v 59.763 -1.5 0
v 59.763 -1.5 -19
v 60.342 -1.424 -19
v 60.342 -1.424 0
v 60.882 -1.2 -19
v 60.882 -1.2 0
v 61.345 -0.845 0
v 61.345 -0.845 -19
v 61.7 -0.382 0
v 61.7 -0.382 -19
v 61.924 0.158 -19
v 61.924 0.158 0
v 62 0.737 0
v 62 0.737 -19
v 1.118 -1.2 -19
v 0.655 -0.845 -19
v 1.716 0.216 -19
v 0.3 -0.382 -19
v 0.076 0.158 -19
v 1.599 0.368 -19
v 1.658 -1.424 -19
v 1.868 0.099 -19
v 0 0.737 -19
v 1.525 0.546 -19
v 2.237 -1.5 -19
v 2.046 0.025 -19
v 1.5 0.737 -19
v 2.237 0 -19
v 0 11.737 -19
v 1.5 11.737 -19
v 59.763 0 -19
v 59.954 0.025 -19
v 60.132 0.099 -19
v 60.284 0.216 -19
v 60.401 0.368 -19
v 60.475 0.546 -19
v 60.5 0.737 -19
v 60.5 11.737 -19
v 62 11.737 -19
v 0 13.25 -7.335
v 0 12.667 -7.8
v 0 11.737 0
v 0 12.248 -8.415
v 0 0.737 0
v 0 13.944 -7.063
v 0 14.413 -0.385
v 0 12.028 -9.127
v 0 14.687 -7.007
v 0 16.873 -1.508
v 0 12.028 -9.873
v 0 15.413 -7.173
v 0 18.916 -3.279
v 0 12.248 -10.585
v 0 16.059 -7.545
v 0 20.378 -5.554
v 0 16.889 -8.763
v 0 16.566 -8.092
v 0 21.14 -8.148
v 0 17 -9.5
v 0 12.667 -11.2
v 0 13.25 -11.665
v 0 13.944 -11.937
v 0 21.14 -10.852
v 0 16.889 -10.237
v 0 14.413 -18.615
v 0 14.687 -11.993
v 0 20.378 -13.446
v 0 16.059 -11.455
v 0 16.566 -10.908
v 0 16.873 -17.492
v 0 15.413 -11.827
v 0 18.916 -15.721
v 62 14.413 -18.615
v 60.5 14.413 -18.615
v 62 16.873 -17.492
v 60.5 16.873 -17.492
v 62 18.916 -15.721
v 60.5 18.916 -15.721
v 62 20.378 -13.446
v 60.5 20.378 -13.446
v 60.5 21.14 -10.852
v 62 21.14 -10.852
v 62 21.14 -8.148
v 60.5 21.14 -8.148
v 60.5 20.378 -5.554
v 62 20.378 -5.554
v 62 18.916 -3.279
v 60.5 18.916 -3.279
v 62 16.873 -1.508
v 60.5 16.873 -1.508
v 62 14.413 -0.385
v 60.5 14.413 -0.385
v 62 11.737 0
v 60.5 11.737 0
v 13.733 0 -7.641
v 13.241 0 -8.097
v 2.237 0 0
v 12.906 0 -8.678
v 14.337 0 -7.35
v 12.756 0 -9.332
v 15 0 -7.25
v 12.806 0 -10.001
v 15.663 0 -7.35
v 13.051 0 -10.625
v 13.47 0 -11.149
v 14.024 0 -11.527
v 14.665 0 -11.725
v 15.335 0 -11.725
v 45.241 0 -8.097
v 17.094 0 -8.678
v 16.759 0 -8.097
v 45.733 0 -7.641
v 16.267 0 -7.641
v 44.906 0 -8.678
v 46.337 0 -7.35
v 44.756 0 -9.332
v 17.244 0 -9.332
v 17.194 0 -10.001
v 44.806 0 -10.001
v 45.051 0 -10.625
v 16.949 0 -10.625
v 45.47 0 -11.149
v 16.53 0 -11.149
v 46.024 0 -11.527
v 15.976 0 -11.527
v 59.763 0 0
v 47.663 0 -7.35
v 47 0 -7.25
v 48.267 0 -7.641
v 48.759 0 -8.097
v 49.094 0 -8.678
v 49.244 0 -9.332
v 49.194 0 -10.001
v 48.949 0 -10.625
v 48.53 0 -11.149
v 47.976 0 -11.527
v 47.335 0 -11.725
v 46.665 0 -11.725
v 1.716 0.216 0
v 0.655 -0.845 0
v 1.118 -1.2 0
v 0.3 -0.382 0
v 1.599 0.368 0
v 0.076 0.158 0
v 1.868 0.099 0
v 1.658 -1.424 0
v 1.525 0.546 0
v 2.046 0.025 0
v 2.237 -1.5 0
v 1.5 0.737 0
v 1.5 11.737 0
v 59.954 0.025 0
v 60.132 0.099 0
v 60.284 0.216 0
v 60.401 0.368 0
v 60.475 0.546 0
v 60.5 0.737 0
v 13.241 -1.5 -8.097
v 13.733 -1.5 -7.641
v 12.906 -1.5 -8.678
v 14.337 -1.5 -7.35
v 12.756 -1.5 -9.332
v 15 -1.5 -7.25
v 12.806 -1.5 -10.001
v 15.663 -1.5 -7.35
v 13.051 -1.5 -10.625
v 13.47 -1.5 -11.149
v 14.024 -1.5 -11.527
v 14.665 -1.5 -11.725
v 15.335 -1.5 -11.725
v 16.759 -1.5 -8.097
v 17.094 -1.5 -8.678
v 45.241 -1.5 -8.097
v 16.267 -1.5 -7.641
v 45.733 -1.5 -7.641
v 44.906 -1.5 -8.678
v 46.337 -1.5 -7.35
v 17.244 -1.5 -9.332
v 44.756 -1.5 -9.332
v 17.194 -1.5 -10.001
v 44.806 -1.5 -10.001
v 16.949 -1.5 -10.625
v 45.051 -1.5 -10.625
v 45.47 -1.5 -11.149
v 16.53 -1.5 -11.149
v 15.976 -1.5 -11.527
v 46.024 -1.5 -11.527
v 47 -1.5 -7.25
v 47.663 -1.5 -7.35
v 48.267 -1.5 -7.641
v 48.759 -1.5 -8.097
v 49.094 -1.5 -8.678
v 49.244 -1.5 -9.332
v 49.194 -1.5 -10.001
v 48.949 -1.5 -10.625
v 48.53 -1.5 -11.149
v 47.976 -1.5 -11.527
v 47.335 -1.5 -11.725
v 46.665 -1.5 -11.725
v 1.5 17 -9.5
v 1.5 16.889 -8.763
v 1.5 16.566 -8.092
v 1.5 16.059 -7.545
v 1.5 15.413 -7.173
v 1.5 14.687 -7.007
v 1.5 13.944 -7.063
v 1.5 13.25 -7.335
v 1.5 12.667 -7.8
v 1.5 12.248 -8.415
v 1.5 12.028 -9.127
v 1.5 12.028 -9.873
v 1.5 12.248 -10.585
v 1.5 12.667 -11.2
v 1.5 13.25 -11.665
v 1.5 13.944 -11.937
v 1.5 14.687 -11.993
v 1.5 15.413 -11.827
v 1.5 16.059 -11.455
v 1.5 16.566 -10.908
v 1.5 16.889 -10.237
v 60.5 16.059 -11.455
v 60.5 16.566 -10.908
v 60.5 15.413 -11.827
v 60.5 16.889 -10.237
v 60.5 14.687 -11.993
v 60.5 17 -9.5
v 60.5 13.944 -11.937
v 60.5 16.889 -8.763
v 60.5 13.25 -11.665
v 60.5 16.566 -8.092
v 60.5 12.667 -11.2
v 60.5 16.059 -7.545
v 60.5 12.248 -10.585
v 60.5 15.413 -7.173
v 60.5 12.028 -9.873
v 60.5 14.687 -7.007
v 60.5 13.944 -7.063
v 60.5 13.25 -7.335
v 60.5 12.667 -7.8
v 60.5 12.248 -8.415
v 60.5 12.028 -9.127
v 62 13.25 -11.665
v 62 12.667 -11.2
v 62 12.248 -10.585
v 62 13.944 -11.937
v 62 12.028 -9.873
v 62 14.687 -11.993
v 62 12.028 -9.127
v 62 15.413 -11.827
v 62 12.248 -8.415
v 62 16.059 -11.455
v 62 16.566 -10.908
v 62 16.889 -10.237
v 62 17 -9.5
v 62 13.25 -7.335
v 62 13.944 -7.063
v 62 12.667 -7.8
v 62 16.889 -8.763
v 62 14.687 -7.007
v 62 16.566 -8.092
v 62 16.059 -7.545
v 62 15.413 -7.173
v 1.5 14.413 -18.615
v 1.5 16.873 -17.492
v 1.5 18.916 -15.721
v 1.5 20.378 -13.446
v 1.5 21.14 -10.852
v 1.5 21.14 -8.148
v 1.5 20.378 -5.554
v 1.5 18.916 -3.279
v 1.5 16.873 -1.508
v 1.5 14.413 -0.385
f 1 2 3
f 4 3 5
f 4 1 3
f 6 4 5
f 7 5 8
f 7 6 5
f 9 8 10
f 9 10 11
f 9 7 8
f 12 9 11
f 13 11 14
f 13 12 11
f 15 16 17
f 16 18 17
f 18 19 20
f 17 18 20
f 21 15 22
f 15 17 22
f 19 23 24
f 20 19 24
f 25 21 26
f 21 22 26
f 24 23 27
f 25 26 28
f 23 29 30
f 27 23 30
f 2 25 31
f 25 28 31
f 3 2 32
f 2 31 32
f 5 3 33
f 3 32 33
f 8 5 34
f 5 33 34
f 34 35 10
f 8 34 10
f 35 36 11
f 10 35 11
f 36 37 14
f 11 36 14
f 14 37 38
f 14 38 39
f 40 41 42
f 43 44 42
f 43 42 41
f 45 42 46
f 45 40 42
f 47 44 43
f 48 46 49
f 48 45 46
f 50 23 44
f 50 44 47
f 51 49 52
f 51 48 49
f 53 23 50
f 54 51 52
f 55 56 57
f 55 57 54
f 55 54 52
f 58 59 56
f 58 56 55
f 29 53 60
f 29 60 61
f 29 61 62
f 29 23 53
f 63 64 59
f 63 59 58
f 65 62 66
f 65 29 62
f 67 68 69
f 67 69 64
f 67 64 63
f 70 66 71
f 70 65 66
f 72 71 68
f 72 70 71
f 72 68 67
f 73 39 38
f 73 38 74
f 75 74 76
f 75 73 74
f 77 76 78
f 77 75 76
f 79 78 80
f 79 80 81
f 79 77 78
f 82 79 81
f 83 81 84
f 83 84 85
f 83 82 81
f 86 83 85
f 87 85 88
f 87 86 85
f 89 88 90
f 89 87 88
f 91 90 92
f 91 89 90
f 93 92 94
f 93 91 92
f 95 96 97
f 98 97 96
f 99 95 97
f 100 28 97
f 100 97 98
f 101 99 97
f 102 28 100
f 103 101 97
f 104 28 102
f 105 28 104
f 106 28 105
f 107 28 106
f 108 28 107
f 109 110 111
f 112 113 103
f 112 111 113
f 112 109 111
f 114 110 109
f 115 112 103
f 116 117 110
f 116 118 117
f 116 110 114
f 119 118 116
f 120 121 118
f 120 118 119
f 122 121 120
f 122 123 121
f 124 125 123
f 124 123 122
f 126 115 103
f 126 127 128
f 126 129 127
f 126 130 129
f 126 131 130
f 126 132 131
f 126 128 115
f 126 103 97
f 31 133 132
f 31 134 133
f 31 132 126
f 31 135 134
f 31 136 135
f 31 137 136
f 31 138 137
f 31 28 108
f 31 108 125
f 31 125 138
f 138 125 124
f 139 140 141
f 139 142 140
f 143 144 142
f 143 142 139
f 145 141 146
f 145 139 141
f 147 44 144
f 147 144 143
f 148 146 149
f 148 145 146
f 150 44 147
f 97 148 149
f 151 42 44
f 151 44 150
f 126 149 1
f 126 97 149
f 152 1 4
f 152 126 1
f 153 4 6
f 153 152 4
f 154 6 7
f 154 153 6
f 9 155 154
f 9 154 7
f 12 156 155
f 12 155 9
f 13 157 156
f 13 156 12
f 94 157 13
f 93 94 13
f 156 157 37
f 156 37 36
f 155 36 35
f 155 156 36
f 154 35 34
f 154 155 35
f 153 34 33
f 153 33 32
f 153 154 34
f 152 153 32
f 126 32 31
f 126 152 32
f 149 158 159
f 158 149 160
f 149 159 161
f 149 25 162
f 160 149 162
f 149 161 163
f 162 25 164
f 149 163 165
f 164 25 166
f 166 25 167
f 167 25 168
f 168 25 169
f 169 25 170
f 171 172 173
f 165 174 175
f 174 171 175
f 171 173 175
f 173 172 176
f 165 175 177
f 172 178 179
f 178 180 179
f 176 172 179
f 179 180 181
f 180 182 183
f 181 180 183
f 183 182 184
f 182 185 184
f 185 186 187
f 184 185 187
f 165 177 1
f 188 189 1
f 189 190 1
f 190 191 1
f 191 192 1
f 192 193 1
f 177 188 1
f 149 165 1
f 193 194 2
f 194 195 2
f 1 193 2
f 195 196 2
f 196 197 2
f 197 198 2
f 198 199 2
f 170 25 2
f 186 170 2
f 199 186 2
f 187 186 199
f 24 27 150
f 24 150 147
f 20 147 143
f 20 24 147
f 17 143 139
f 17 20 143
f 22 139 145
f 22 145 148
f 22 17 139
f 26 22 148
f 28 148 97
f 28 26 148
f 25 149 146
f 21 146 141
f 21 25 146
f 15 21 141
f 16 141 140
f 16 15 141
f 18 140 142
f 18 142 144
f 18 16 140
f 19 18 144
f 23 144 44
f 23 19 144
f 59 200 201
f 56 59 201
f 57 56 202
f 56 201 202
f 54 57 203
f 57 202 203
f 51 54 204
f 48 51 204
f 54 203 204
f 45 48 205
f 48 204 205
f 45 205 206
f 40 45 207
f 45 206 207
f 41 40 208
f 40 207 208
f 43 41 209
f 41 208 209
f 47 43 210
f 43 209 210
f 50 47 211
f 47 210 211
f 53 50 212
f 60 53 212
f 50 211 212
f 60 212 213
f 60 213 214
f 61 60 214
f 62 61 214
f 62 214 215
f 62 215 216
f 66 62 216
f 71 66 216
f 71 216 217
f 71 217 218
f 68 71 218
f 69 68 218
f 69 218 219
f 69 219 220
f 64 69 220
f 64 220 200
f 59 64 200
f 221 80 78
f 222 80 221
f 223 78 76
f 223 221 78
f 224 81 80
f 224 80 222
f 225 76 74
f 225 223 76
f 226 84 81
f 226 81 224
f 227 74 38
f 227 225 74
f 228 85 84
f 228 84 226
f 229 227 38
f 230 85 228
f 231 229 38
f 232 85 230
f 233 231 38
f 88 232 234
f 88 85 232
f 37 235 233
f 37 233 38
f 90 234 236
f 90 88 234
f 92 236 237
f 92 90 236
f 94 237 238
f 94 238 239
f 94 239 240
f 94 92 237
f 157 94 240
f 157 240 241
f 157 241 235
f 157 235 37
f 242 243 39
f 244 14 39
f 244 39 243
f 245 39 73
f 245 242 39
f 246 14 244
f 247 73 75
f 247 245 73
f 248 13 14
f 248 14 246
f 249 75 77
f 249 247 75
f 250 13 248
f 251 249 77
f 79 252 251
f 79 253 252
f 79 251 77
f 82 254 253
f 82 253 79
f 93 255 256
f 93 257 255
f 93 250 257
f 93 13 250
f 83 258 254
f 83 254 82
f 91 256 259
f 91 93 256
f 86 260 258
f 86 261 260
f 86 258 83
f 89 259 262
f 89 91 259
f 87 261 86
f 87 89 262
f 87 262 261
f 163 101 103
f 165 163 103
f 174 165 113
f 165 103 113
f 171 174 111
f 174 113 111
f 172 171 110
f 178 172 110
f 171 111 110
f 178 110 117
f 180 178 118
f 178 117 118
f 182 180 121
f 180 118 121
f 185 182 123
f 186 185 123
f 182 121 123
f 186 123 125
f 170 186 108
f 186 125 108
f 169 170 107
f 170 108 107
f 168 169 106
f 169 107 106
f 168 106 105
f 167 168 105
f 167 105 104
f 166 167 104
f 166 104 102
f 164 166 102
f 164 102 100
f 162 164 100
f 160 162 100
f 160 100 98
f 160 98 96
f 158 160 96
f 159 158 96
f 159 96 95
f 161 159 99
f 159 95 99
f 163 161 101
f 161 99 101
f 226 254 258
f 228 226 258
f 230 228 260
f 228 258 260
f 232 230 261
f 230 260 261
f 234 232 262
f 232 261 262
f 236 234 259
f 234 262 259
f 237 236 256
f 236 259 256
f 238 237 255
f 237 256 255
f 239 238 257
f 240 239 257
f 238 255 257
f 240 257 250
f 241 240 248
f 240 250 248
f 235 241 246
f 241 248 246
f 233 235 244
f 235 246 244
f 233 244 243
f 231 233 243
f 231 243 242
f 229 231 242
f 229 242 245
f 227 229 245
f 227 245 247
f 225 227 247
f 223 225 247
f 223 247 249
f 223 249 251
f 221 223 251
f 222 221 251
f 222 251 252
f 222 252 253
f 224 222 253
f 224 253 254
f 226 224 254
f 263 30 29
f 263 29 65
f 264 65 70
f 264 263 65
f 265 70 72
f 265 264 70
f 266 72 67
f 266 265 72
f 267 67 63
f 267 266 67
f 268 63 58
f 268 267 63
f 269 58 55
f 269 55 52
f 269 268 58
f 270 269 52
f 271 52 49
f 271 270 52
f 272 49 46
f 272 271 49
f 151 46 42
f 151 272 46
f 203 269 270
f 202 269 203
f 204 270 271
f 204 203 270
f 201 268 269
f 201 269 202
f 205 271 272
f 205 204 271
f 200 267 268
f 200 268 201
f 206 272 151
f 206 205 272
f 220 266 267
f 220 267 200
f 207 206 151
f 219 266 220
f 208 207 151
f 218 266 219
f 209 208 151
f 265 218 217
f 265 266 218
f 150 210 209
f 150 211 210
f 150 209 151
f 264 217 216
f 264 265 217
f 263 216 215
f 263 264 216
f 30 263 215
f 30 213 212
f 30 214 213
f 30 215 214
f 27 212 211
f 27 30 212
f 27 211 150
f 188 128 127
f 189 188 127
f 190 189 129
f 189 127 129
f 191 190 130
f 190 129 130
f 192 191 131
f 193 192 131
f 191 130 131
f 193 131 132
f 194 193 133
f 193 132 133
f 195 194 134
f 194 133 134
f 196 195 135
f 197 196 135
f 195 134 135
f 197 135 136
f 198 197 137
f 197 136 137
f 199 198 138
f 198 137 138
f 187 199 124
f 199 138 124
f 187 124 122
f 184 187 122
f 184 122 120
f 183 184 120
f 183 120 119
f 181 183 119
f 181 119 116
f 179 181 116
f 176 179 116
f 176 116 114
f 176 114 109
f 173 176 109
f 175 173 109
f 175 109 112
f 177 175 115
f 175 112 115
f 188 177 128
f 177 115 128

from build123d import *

# Parameters (mm, degrees)
SKETCH1_W                    = 62
SKETCH1_H                    = 19
SKETCH1_R                    = 2.25
BASE_FLANGE1_DEPTH           = 1.5
EDGE_FLANGE1_STRIP_W         = 7.4732
EDGE_FLANGE1_STRIP_H         = 1.5
EDGE_FLANGE1_STRIP_CUT_DEPTH = 19
EDGE_FLANGE1_DEPTH           = 19
EDGE_FLANGE2_STRIP_W         = 7.4732
EDGE_FLANGE2_STRIP_H         = 1.5
EDGE_FLANGE2_STRIP_CUT_DEPTH = 19
EDGE_FLANGE2_DEPTH           = 19
SKETCH12_R                   = 2.5
CUT_EXTRUDE1_DEPTH           = 69.317274536


# Sheet-metal steps are written as plain solids
with BuildPart() as part:
    # Sketch1 → Base-Flange1 (new body)
    with BuildSketch(Plane(origin=(0, 0, 0), x_dir=(1, 0, 0), z_dir=(0, 1, 0))):
        with Locations((31, 9.5)):
            Rectangle(SKETCH1_W, SKETCH1_H)
        with Locations(Location((15, 9.5, 0), (0, 0, 270))):
            Circle(SKETCH1_R, mode=Mode.SUBTRACT)
        with Locations(Location((47, 9.5, 0), (0, 0, 270))):
            Circle(SKETCH1_R, mode=Mode.SUBTRACT)
    extrude(amount=-BASE_FLANGE1_DEPTH)

    # Edge-Flange1 strip (across the edge) → Edge-Flange1 strip cut (cut)
    with BuildSketch(Plane.XY.offset(-19)):
        with Locations((-1.5, -0.75)):
            Rectangle(EDGE_FLANGE1_STRIP_W, EDGE_FLANGE1_STRIP_H)
    extrude(amount=EDGE_FLANGE1_STRIP_CUT_DEPTH, mode=Mode.SUBTRACT)

    # Edge-Flange1 section (across the edge) → Edge-Flange1 (add)
    with BuildSketch(Plane.XY.offset(-19)):
        with BuildLine():
            Line((0, 0.7366), (0, 21.5))
            Line((0, 21.5), (1.5, 21.5))
            Line((1.5, 21.5), (1.5, 0.7366))
            ThreePointArc((1.5, 0.7366), (1.715745145, 0.215745145), (2.2366, 0))
            Line((2.2366, 0), (2.2366, -1.5))
            ThreePointArc((2.2366, -1.5), (0.655084973, -0.844915027), (0, 0.7366))
        make_face()
    extrude(amount=EDGE_FLANGE1_DEPTH)

    # Edge-Flange2 strip (across the edge) → Edge-Flange2 strip cut (cut)
    with BuildSketch(Plane(origin=(62, 0, 0), x_dir=(-1, 0, 0), z_dir=(0, 0, -1))):
        with Locations((-1.5, -0.75)):
            Rectangle(EDGE_FLANGE2_STRIP_W, EDGE_FLANGE2_STRIP_H)
    extrude(amount=EDGE_FLANGE2_STRIP_CUT_DEPTH, mode=Mode.SUBTRACT)

    # Edge-Flange2 section (across the edge) → Edge-Flange2 (add)
    with BuildSketch(Plane(origin=(62, 0, 0), x_dir=(-1, 0, 0), z_dir=(0, 0, -1))):
        with BuildLine():
            Line((0, 0.7366), (0, 21.5))
            Line((0, 21.5), (1.5, 21.5))
            Line((1.5, 21.5), (1.5, 0.7366))
            ThreePointArc((1.5, 0.7366), (1.715745145, 0.215745145), (2.2366, 0))
            Line((2.2366, 0), (2.2366, -1.5))
            ThreePointArc((2.2366, -1.5), (0.655084973, -0.844915027), (0, 0.7366))
        make_face()
    extrude(amount=EDGE_FLANGE2_DEPTH)

    # Sketch12 → Cut-Extrude1 (cut, through all)
    with BuildSketch(Plane(origin=(62, 0, 0), x_dir=(0, 0, -1), z_dir=(1, 0, 0))):
        with Locations(Location((9.5, 14.5, 0), (0, 0, 90))):
            Circle(SKETCH12_R)
        with BuildLine():
            Line((0, 11.7366), (-3.023600292, 11.7366))
            Line((-3.023600292, 11.7366), (-3.023600292, 23.521513474))
            Line((-3.023600292, 23.521513474), (21.663618521, 23.521513474))
            Line((21.663618521, 23.521513474), (21.663618521, 11.7366))
            Line((21.663618521, 11.7366), (19, 11.7366))
            ThreePointArc((19, 11.7366), (9.5, 21.2366), (0, 11.7366))
        make_face()
    extrude(amount=-CUT_EXTRUDE1_DEPTH, mode=Mode.SUBTRACT)


solid = part.part
